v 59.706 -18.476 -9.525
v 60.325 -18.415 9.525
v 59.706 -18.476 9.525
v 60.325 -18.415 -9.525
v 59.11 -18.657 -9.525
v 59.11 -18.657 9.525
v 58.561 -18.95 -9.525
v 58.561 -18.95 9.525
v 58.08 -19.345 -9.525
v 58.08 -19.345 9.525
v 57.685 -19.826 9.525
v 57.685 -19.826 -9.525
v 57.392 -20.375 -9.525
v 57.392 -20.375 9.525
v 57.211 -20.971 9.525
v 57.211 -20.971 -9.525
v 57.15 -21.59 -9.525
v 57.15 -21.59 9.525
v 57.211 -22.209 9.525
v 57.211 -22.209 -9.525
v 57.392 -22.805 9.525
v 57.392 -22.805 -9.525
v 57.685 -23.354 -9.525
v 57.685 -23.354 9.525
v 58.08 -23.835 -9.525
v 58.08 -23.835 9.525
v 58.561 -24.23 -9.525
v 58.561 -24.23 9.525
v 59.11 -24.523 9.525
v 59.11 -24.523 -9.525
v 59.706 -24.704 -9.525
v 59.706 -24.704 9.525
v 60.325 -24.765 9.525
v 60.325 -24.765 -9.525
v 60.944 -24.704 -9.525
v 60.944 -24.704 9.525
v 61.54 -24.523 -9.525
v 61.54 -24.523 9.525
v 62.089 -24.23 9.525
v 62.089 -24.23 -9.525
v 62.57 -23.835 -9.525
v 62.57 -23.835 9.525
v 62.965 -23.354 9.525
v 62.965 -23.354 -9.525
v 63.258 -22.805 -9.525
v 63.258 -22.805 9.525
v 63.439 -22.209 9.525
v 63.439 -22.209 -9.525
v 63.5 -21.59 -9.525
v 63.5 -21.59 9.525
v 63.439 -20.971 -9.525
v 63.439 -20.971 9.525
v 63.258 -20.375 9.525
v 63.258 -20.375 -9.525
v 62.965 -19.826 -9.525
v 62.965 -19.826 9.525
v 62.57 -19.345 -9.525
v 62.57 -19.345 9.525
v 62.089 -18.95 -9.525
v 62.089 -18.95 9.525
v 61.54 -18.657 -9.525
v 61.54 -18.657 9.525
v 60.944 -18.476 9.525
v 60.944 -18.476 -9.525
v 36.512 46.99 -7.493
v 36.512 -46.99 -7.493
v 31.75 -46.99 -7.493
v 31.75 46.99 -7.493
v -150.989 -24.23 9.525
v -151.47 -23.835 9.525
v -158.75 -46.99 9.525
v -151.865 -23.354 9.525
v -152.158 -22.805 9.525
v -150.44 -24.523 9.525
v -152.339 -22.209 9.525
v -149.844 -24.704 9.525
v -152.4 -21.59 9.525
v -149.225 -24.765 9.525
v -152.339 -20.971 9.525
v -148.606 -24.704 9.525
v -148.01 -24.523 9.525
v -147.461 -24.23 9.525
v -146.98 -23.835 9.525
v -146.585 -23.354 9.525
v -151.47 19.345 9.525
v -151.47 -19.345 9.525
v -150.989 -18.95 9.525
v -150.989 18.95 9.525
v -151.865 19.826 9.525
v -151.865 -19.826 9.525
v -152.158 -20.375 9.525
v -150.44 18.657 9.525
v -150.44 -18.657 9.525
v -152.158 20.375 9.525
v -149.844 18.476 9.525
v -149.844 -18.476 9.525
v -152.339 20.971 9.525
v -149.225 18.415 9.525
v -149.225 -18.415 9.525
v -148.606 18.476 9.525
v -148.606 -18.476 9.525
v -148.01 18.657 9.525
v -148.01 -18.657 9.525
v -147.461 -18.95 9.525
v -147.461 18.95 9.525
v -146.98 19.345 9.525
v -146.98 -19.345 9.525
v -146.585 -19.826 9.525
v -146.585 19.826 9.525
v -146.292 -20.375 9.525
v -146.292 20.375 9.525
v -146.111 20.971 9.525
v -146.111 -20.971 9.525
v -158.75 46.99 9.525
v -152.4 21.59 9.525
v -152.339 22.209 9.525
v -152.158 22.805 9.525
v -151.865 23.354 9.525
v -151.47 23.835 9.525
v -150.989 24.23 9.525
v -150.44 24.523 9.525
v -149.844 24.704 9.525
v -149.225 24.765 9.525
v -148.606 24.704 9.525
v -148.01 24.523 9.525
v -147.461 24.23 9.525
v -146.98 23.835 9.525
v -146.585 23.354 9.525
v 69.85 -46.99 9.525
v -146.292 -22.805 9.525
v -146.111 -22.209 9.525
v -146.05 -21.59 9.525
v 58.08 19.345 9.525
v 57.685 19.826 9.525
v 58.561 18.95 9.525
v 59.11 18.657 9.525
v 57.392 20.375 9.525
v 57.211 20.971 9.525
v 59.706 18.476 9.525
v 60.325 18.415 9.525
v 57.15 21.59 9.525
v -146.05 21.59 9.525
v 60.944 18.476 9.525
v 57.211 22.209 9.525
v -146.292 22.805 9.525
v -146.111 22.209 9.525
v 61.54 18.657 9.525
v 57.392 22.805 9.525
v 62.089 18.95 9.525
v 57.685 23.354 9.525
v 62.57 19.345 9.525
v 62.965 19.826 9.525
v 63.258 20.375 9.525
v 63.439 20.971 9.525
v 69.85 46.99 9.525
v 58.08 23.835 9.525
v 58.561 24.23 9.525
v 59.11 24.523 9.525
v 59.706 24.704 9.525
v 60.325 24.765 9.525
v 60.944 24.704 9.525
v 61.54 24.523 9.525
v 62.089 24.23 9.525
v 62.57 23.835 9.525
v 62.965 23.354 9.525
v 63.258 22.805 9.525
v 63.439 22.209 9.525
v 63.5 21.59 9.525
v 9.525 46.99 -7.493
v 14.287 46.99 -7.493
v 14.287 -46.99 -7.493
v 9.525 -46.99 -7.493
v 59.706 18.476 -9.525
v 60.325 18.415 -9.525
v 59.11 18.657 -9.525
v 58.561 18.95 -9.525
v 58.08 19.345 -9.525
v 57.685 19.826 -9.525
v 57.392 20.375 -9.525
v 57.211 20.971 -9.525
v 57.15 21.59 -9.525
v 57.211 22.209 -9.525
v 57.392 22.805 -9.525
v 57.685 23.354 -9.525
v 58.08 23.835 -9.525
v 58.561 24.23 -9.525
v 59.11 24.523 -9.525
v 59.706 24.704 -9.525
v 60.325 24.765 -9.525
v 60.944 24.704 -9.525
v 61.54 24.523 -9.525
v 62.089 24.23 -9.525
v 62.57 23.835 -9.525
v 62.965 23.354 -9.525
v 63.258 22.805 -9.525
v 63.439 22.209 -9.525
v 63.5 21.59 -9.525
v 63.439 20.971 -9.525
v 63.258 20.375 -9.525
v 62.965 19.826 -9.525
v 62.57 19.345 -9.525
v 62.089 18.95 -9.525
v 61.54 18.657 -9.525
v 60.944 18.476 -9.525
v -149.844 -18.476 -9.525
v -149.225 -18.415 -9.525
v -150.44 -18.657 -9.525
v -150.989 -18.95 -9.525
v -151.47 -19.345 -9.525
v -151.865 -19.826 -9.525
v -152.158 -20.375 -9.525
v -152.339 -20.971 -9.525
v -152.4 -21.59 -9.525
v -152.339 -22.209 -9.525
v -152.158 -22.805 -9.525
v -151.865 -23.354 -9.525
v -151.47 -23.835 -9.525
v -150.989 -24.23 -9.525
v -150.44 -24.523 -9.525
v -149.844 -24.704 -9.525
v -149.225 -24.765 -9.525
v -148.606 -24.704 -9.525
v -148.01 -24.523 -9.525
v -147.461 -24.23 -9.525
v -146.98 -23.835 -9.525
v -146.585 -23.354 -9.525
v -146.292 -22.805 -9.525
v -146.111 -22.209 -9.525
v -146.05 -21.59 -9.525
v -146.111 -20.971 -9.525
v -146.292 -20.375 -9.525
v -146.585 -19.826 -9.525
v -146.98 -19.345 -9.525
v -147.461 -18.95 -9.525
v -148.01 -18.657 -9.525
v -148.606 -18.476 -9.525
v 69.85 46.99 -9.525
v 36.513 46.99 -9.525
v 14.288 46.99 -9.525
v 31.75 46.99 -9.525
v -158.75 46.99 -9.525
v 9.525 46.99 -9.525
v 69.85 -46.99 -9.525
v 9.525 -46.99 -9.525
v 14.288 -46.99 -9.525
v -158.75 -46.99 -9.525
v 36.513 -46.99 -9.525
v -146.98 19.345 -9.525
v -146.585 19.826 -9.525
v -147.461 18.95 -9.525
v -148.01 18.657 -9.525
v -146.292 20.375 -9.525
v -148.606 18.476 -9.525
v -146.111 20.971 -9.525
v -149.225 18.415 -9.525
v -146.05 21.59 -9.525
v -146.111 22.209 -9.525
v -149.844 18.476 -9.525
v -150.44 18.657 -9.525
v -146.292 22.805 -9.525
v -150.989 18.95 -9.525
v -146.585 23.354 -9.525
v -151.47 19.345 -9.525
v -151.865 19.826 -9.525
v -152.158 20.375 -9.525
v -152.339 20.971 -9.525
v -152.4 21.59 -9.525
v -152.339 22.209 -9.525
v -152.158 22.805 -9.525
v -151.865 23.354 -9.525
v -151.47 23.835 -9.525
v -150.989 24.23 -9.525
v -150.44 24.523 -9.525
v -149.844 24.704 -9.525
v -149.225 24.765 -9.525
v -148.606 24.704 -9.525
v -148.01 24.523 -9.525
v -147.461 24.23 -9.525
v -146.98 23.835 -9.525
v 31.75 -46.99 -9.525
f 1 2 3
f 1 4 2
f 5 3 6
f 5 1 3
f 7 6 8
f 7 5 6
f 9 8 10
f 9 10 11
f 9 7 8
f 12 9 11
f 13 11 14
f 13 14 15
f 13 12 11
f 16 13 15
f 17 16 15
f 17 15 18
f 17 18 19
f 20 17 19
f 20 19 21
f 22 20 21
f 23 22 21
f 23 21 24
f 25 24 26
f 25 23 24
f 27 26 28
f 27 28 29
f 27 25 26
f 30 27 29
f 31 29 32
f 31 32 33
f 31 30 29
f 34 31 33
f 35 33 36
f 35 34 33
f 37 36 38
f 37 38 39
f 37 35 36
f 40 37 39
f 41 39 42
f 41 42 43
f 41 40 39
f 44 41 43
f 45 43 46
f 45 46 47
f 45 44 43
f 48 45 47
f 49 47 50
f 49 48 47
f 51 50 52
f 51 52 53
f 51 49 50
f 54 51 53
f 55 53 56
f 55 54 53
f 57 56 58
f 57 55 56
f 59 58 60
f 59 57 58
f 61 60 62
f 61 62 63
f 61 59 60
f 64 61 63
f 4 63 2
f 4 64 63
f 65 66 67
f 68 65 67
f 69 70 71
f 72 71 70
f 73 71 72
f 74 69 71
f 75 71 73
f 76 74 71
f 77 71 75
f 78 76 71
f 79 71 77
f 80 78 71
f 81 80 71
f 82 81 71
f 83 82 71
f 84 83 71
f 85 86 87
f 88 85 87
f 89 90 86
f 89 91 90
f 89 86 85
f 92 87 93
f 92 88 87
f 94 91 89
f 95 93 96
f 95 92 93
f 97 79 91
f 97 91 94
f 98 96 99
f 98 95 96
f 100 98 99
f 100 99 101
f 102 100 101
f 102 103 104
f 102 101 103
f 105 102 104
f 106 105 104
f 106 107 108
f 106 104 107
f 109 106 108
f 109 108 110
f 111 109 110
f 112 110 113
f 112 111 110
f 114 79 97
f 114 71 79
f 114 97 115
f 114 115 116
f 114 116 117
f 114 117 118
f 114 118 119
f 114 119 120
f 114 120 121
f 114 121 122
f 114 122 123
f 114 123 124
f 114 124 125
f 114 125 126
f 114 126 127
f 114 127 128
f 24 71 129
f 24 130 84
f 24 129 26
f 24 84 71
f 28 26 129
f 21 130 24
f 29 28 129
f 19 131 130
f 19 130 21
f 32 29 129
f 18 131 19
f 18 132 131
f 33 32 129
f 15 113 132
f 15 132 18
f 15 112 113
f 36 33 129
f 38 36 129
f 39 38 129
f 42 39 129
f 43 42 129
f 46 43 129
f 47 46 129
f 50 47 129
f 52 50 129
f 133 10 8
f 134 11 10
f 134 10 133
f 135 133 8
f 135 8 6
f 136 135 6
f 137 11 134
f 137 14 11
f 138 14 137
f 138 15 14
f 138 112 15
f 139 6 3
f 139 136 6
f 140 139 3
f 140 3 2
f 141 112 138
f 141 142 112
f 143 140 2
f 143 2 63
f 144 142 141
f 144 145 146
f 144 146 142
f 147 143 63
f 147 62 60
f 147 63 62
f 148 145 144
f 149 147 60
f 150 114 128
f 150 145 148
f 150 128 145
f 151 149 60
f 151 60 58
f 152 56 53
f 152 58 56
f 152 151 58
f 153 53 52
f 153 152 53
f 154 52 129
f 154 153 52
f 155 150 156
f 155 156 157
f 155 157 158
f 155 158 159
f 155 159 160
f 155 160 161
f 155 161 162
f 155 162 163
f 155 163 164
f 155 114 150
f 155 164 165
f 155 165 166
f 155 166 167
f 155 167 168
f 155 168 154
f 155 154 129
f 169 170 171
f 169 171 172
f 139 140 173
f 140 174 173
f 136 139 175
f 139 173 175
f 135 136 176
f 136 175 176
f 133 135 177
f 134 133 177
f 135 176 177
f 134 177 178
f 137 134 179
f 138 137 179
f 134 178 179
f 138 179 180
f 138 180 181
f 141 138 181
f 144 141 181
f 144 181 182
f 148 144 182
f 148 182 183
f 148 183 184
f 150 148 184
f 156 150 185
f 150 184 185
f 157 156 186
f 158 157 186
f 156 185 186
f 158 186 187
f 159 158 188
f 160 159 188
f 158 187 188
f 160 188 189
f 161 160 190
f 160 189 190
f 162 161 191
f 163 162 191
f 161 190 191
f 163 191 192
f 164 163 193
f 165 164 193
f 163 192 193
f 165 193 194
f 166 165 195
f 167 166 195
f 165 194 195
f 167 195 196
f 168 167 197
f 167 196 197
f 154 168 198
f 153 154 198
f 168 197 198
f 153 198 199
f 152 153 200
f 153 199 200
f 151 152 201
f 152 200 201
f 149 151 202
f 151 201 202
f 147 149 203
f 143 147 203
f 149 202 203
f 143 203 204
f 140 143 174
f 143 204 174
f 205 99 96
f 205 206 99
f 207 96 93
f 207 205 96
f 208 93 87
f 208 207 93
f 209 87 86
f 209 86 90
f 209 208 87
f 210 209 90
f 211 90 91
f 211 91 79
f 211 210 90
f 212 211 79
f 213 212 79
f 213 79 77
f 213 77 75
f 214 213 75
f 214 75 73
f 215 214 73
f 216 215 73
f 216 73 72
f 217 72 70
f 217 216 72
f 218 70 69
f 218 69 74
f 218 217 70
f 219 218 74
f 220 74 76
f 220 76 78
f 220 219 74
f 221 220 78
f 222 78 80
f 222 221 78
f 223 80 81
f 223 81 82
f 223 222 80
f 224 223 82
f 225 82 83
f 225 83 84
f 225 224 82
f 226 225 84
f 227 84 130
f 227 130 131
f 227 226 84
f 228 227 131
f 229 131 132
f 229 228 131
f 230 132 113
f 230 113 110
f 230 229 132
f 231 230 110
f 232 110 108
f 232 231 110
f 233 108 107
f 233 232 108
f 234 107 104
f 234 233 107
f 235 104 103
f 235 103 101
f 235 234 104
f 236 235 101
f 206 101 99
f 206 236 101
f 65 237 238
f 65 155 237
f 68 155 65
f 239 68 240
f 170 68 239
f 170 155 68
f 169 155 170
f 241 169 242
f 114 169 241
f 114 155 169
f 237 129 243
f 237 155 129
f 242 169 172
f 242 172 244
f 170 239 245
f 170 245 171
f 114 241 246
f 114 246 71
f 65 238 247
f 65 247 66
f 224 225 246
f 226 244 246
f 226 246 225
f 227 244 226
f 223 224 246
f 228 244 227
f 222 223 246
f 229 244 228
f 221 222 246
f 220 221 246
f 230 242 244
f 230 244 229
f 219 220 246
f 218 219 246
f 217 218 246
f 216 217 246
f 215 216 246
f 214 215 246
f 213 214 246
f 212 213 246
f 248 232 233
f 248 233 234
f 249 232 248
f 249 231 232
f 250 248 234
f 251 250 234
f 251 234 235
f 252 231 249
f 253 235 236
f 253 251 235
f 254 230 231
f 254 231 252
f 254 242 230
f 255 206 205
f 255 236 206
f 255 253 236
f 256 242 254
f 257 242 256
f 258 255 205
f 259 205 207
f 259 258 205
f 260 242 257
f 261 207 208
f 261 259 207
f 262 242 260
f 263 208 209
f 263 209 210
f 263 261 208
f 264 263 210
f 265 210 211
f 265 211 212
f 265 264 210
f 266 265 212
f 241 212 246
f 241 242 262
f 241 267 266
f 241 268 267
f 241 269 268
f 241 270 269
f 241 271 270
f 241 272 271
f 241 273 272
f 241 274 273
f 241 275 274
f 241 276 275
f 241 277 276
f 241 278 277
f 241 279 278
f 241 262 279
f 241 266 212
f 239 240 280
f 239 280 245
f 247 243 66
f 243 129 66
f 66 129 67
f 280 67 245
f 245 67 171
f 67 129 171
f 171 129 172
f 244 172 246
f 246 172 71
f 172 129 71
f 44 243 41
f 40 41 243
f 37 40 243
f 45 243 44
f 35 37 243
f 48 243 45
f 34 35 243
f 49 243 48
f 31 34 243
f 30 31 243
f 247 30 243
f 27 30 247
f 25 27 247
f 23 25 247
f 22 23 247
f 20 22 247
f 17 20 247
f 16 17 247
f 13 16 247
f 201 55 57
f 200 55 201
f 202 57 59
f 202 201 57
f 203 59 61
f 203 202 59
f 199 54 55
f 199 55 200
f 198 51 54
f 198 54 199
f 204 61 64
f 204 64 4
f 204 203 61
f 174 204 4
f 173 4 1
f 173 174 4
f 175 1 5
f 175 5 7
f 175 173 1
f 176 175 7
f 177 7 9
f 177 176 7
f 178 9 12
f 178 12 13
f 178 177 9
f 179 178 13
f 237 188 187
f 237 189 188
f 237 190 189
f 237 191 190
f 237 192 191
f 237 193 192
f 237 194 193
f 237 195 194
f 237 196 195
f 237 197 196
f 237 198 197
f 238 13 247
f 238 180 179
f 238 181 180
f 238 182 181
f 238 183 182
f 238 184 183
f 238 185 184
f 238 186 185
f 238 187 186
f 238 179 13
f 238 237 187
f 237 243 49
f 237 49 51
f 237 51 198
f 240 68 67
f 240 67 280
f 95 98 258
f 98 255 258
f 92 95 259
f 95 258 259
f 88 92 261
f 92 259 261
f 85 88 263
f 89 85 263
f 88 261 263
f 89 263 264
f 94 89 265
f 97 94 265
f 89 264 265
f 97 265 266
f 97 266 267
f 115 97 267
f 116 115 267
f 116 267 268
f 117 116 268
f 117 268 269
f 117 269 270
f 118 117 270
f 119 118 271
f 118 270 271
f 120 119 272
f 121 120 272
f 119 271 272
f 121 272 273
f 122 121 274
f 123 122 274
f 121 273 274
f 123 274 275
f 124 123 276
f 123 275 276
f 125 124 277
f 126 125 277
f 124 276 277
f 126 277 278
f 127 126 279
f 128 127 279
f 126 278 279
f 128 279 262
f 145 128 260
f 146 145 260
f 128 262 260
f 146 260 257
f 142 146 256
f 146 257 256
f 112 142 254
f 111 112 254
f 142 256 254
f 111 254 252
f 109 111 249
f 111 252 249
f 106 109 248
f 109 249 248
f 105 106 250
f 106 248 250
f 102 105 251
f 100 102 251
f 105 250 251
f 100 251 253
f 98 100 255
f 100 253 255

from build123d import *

# Parameters (mm, degrees)
BOSS_EXTRUDE2_DEPTH = 46.99


with BuildPart() as part:
    # 3DSketch2 → Boss-Extrude2 (new, symmetric)
    with BuildSketch(Plane(origin=(69.85, 0, -9.525), x_dir=(-0.9965457582448797, 0, 0.08304547985373997), z_dir=(0, 1, 0))):
        Polygon((0, 0), (33.222344215, -2.768528685), (33.391092631, -0.743547704), (38.137141804, -1.139051802), (37.968393389, -3.164032782), (55.370573692, -4.614214474), (55.539322108, -2.589233494), (60.285371281, -2.984737591), (60.116622866, -5.009718572), (227.810360335, -18.984196695), (229.392376726, 0), (1.582016391, 18.984196695), align=None)
    extrude(amount=BOSS_EXTRUDE2_DEPTH, both=True)

    # Sketch1 → 1/4 (0.25) Diameter Hole1 (revolve, cut)
    with BuildSketch(Plane(origin=(-149.225, -21.59, -9.525), x_dir=(0, 1, 0), z_dir=(1, 0, 0))):
        Polygon((0, 0), (0, 20.957732465), (3.175, 19.05), (3.175, 0), align=None)
    f_1_4_0_25_diameter_hole1 = revolve(axis=Axis((-149.225, -21.59, -15.875), (0, 0, 1)), mode=Mode.SUBTRACT)

    # Mirror1: 1/4 (0.25) Diameter Hole1 across plane
    add(f_1_4_0_25_diameter_hole1.mirror(Plane.ZX), mode=Mode.SUBTRACT)

    # Sketch3 → 1/4 (0.25) Diameter Hole2 (revolve, cut)
    with BuildSketch(Plane(origin=(60.325, -21.59, -9.525), x_dir=(0, 1, 0), z_dir=(1, 0, 0))):
        Polygon((0, 0), (0, 20.957732465), (3.175, 19.05), (3.175, 0), align=None)
    f_1_4_0_25_diameter_hole2 = revolve(axis=Axis((60.325, -21.59, -15.875), (0, 0, 1)), mode=Mode.SUBTRACT)

    # Mirror2: 1/4 (0.25) Diameter Hole2 across plane
    add(f_1_4_0_25_diameter_hole2.mirror(Plane.ZX), mode=Mode.SUBTRACT)


solid = part.part
